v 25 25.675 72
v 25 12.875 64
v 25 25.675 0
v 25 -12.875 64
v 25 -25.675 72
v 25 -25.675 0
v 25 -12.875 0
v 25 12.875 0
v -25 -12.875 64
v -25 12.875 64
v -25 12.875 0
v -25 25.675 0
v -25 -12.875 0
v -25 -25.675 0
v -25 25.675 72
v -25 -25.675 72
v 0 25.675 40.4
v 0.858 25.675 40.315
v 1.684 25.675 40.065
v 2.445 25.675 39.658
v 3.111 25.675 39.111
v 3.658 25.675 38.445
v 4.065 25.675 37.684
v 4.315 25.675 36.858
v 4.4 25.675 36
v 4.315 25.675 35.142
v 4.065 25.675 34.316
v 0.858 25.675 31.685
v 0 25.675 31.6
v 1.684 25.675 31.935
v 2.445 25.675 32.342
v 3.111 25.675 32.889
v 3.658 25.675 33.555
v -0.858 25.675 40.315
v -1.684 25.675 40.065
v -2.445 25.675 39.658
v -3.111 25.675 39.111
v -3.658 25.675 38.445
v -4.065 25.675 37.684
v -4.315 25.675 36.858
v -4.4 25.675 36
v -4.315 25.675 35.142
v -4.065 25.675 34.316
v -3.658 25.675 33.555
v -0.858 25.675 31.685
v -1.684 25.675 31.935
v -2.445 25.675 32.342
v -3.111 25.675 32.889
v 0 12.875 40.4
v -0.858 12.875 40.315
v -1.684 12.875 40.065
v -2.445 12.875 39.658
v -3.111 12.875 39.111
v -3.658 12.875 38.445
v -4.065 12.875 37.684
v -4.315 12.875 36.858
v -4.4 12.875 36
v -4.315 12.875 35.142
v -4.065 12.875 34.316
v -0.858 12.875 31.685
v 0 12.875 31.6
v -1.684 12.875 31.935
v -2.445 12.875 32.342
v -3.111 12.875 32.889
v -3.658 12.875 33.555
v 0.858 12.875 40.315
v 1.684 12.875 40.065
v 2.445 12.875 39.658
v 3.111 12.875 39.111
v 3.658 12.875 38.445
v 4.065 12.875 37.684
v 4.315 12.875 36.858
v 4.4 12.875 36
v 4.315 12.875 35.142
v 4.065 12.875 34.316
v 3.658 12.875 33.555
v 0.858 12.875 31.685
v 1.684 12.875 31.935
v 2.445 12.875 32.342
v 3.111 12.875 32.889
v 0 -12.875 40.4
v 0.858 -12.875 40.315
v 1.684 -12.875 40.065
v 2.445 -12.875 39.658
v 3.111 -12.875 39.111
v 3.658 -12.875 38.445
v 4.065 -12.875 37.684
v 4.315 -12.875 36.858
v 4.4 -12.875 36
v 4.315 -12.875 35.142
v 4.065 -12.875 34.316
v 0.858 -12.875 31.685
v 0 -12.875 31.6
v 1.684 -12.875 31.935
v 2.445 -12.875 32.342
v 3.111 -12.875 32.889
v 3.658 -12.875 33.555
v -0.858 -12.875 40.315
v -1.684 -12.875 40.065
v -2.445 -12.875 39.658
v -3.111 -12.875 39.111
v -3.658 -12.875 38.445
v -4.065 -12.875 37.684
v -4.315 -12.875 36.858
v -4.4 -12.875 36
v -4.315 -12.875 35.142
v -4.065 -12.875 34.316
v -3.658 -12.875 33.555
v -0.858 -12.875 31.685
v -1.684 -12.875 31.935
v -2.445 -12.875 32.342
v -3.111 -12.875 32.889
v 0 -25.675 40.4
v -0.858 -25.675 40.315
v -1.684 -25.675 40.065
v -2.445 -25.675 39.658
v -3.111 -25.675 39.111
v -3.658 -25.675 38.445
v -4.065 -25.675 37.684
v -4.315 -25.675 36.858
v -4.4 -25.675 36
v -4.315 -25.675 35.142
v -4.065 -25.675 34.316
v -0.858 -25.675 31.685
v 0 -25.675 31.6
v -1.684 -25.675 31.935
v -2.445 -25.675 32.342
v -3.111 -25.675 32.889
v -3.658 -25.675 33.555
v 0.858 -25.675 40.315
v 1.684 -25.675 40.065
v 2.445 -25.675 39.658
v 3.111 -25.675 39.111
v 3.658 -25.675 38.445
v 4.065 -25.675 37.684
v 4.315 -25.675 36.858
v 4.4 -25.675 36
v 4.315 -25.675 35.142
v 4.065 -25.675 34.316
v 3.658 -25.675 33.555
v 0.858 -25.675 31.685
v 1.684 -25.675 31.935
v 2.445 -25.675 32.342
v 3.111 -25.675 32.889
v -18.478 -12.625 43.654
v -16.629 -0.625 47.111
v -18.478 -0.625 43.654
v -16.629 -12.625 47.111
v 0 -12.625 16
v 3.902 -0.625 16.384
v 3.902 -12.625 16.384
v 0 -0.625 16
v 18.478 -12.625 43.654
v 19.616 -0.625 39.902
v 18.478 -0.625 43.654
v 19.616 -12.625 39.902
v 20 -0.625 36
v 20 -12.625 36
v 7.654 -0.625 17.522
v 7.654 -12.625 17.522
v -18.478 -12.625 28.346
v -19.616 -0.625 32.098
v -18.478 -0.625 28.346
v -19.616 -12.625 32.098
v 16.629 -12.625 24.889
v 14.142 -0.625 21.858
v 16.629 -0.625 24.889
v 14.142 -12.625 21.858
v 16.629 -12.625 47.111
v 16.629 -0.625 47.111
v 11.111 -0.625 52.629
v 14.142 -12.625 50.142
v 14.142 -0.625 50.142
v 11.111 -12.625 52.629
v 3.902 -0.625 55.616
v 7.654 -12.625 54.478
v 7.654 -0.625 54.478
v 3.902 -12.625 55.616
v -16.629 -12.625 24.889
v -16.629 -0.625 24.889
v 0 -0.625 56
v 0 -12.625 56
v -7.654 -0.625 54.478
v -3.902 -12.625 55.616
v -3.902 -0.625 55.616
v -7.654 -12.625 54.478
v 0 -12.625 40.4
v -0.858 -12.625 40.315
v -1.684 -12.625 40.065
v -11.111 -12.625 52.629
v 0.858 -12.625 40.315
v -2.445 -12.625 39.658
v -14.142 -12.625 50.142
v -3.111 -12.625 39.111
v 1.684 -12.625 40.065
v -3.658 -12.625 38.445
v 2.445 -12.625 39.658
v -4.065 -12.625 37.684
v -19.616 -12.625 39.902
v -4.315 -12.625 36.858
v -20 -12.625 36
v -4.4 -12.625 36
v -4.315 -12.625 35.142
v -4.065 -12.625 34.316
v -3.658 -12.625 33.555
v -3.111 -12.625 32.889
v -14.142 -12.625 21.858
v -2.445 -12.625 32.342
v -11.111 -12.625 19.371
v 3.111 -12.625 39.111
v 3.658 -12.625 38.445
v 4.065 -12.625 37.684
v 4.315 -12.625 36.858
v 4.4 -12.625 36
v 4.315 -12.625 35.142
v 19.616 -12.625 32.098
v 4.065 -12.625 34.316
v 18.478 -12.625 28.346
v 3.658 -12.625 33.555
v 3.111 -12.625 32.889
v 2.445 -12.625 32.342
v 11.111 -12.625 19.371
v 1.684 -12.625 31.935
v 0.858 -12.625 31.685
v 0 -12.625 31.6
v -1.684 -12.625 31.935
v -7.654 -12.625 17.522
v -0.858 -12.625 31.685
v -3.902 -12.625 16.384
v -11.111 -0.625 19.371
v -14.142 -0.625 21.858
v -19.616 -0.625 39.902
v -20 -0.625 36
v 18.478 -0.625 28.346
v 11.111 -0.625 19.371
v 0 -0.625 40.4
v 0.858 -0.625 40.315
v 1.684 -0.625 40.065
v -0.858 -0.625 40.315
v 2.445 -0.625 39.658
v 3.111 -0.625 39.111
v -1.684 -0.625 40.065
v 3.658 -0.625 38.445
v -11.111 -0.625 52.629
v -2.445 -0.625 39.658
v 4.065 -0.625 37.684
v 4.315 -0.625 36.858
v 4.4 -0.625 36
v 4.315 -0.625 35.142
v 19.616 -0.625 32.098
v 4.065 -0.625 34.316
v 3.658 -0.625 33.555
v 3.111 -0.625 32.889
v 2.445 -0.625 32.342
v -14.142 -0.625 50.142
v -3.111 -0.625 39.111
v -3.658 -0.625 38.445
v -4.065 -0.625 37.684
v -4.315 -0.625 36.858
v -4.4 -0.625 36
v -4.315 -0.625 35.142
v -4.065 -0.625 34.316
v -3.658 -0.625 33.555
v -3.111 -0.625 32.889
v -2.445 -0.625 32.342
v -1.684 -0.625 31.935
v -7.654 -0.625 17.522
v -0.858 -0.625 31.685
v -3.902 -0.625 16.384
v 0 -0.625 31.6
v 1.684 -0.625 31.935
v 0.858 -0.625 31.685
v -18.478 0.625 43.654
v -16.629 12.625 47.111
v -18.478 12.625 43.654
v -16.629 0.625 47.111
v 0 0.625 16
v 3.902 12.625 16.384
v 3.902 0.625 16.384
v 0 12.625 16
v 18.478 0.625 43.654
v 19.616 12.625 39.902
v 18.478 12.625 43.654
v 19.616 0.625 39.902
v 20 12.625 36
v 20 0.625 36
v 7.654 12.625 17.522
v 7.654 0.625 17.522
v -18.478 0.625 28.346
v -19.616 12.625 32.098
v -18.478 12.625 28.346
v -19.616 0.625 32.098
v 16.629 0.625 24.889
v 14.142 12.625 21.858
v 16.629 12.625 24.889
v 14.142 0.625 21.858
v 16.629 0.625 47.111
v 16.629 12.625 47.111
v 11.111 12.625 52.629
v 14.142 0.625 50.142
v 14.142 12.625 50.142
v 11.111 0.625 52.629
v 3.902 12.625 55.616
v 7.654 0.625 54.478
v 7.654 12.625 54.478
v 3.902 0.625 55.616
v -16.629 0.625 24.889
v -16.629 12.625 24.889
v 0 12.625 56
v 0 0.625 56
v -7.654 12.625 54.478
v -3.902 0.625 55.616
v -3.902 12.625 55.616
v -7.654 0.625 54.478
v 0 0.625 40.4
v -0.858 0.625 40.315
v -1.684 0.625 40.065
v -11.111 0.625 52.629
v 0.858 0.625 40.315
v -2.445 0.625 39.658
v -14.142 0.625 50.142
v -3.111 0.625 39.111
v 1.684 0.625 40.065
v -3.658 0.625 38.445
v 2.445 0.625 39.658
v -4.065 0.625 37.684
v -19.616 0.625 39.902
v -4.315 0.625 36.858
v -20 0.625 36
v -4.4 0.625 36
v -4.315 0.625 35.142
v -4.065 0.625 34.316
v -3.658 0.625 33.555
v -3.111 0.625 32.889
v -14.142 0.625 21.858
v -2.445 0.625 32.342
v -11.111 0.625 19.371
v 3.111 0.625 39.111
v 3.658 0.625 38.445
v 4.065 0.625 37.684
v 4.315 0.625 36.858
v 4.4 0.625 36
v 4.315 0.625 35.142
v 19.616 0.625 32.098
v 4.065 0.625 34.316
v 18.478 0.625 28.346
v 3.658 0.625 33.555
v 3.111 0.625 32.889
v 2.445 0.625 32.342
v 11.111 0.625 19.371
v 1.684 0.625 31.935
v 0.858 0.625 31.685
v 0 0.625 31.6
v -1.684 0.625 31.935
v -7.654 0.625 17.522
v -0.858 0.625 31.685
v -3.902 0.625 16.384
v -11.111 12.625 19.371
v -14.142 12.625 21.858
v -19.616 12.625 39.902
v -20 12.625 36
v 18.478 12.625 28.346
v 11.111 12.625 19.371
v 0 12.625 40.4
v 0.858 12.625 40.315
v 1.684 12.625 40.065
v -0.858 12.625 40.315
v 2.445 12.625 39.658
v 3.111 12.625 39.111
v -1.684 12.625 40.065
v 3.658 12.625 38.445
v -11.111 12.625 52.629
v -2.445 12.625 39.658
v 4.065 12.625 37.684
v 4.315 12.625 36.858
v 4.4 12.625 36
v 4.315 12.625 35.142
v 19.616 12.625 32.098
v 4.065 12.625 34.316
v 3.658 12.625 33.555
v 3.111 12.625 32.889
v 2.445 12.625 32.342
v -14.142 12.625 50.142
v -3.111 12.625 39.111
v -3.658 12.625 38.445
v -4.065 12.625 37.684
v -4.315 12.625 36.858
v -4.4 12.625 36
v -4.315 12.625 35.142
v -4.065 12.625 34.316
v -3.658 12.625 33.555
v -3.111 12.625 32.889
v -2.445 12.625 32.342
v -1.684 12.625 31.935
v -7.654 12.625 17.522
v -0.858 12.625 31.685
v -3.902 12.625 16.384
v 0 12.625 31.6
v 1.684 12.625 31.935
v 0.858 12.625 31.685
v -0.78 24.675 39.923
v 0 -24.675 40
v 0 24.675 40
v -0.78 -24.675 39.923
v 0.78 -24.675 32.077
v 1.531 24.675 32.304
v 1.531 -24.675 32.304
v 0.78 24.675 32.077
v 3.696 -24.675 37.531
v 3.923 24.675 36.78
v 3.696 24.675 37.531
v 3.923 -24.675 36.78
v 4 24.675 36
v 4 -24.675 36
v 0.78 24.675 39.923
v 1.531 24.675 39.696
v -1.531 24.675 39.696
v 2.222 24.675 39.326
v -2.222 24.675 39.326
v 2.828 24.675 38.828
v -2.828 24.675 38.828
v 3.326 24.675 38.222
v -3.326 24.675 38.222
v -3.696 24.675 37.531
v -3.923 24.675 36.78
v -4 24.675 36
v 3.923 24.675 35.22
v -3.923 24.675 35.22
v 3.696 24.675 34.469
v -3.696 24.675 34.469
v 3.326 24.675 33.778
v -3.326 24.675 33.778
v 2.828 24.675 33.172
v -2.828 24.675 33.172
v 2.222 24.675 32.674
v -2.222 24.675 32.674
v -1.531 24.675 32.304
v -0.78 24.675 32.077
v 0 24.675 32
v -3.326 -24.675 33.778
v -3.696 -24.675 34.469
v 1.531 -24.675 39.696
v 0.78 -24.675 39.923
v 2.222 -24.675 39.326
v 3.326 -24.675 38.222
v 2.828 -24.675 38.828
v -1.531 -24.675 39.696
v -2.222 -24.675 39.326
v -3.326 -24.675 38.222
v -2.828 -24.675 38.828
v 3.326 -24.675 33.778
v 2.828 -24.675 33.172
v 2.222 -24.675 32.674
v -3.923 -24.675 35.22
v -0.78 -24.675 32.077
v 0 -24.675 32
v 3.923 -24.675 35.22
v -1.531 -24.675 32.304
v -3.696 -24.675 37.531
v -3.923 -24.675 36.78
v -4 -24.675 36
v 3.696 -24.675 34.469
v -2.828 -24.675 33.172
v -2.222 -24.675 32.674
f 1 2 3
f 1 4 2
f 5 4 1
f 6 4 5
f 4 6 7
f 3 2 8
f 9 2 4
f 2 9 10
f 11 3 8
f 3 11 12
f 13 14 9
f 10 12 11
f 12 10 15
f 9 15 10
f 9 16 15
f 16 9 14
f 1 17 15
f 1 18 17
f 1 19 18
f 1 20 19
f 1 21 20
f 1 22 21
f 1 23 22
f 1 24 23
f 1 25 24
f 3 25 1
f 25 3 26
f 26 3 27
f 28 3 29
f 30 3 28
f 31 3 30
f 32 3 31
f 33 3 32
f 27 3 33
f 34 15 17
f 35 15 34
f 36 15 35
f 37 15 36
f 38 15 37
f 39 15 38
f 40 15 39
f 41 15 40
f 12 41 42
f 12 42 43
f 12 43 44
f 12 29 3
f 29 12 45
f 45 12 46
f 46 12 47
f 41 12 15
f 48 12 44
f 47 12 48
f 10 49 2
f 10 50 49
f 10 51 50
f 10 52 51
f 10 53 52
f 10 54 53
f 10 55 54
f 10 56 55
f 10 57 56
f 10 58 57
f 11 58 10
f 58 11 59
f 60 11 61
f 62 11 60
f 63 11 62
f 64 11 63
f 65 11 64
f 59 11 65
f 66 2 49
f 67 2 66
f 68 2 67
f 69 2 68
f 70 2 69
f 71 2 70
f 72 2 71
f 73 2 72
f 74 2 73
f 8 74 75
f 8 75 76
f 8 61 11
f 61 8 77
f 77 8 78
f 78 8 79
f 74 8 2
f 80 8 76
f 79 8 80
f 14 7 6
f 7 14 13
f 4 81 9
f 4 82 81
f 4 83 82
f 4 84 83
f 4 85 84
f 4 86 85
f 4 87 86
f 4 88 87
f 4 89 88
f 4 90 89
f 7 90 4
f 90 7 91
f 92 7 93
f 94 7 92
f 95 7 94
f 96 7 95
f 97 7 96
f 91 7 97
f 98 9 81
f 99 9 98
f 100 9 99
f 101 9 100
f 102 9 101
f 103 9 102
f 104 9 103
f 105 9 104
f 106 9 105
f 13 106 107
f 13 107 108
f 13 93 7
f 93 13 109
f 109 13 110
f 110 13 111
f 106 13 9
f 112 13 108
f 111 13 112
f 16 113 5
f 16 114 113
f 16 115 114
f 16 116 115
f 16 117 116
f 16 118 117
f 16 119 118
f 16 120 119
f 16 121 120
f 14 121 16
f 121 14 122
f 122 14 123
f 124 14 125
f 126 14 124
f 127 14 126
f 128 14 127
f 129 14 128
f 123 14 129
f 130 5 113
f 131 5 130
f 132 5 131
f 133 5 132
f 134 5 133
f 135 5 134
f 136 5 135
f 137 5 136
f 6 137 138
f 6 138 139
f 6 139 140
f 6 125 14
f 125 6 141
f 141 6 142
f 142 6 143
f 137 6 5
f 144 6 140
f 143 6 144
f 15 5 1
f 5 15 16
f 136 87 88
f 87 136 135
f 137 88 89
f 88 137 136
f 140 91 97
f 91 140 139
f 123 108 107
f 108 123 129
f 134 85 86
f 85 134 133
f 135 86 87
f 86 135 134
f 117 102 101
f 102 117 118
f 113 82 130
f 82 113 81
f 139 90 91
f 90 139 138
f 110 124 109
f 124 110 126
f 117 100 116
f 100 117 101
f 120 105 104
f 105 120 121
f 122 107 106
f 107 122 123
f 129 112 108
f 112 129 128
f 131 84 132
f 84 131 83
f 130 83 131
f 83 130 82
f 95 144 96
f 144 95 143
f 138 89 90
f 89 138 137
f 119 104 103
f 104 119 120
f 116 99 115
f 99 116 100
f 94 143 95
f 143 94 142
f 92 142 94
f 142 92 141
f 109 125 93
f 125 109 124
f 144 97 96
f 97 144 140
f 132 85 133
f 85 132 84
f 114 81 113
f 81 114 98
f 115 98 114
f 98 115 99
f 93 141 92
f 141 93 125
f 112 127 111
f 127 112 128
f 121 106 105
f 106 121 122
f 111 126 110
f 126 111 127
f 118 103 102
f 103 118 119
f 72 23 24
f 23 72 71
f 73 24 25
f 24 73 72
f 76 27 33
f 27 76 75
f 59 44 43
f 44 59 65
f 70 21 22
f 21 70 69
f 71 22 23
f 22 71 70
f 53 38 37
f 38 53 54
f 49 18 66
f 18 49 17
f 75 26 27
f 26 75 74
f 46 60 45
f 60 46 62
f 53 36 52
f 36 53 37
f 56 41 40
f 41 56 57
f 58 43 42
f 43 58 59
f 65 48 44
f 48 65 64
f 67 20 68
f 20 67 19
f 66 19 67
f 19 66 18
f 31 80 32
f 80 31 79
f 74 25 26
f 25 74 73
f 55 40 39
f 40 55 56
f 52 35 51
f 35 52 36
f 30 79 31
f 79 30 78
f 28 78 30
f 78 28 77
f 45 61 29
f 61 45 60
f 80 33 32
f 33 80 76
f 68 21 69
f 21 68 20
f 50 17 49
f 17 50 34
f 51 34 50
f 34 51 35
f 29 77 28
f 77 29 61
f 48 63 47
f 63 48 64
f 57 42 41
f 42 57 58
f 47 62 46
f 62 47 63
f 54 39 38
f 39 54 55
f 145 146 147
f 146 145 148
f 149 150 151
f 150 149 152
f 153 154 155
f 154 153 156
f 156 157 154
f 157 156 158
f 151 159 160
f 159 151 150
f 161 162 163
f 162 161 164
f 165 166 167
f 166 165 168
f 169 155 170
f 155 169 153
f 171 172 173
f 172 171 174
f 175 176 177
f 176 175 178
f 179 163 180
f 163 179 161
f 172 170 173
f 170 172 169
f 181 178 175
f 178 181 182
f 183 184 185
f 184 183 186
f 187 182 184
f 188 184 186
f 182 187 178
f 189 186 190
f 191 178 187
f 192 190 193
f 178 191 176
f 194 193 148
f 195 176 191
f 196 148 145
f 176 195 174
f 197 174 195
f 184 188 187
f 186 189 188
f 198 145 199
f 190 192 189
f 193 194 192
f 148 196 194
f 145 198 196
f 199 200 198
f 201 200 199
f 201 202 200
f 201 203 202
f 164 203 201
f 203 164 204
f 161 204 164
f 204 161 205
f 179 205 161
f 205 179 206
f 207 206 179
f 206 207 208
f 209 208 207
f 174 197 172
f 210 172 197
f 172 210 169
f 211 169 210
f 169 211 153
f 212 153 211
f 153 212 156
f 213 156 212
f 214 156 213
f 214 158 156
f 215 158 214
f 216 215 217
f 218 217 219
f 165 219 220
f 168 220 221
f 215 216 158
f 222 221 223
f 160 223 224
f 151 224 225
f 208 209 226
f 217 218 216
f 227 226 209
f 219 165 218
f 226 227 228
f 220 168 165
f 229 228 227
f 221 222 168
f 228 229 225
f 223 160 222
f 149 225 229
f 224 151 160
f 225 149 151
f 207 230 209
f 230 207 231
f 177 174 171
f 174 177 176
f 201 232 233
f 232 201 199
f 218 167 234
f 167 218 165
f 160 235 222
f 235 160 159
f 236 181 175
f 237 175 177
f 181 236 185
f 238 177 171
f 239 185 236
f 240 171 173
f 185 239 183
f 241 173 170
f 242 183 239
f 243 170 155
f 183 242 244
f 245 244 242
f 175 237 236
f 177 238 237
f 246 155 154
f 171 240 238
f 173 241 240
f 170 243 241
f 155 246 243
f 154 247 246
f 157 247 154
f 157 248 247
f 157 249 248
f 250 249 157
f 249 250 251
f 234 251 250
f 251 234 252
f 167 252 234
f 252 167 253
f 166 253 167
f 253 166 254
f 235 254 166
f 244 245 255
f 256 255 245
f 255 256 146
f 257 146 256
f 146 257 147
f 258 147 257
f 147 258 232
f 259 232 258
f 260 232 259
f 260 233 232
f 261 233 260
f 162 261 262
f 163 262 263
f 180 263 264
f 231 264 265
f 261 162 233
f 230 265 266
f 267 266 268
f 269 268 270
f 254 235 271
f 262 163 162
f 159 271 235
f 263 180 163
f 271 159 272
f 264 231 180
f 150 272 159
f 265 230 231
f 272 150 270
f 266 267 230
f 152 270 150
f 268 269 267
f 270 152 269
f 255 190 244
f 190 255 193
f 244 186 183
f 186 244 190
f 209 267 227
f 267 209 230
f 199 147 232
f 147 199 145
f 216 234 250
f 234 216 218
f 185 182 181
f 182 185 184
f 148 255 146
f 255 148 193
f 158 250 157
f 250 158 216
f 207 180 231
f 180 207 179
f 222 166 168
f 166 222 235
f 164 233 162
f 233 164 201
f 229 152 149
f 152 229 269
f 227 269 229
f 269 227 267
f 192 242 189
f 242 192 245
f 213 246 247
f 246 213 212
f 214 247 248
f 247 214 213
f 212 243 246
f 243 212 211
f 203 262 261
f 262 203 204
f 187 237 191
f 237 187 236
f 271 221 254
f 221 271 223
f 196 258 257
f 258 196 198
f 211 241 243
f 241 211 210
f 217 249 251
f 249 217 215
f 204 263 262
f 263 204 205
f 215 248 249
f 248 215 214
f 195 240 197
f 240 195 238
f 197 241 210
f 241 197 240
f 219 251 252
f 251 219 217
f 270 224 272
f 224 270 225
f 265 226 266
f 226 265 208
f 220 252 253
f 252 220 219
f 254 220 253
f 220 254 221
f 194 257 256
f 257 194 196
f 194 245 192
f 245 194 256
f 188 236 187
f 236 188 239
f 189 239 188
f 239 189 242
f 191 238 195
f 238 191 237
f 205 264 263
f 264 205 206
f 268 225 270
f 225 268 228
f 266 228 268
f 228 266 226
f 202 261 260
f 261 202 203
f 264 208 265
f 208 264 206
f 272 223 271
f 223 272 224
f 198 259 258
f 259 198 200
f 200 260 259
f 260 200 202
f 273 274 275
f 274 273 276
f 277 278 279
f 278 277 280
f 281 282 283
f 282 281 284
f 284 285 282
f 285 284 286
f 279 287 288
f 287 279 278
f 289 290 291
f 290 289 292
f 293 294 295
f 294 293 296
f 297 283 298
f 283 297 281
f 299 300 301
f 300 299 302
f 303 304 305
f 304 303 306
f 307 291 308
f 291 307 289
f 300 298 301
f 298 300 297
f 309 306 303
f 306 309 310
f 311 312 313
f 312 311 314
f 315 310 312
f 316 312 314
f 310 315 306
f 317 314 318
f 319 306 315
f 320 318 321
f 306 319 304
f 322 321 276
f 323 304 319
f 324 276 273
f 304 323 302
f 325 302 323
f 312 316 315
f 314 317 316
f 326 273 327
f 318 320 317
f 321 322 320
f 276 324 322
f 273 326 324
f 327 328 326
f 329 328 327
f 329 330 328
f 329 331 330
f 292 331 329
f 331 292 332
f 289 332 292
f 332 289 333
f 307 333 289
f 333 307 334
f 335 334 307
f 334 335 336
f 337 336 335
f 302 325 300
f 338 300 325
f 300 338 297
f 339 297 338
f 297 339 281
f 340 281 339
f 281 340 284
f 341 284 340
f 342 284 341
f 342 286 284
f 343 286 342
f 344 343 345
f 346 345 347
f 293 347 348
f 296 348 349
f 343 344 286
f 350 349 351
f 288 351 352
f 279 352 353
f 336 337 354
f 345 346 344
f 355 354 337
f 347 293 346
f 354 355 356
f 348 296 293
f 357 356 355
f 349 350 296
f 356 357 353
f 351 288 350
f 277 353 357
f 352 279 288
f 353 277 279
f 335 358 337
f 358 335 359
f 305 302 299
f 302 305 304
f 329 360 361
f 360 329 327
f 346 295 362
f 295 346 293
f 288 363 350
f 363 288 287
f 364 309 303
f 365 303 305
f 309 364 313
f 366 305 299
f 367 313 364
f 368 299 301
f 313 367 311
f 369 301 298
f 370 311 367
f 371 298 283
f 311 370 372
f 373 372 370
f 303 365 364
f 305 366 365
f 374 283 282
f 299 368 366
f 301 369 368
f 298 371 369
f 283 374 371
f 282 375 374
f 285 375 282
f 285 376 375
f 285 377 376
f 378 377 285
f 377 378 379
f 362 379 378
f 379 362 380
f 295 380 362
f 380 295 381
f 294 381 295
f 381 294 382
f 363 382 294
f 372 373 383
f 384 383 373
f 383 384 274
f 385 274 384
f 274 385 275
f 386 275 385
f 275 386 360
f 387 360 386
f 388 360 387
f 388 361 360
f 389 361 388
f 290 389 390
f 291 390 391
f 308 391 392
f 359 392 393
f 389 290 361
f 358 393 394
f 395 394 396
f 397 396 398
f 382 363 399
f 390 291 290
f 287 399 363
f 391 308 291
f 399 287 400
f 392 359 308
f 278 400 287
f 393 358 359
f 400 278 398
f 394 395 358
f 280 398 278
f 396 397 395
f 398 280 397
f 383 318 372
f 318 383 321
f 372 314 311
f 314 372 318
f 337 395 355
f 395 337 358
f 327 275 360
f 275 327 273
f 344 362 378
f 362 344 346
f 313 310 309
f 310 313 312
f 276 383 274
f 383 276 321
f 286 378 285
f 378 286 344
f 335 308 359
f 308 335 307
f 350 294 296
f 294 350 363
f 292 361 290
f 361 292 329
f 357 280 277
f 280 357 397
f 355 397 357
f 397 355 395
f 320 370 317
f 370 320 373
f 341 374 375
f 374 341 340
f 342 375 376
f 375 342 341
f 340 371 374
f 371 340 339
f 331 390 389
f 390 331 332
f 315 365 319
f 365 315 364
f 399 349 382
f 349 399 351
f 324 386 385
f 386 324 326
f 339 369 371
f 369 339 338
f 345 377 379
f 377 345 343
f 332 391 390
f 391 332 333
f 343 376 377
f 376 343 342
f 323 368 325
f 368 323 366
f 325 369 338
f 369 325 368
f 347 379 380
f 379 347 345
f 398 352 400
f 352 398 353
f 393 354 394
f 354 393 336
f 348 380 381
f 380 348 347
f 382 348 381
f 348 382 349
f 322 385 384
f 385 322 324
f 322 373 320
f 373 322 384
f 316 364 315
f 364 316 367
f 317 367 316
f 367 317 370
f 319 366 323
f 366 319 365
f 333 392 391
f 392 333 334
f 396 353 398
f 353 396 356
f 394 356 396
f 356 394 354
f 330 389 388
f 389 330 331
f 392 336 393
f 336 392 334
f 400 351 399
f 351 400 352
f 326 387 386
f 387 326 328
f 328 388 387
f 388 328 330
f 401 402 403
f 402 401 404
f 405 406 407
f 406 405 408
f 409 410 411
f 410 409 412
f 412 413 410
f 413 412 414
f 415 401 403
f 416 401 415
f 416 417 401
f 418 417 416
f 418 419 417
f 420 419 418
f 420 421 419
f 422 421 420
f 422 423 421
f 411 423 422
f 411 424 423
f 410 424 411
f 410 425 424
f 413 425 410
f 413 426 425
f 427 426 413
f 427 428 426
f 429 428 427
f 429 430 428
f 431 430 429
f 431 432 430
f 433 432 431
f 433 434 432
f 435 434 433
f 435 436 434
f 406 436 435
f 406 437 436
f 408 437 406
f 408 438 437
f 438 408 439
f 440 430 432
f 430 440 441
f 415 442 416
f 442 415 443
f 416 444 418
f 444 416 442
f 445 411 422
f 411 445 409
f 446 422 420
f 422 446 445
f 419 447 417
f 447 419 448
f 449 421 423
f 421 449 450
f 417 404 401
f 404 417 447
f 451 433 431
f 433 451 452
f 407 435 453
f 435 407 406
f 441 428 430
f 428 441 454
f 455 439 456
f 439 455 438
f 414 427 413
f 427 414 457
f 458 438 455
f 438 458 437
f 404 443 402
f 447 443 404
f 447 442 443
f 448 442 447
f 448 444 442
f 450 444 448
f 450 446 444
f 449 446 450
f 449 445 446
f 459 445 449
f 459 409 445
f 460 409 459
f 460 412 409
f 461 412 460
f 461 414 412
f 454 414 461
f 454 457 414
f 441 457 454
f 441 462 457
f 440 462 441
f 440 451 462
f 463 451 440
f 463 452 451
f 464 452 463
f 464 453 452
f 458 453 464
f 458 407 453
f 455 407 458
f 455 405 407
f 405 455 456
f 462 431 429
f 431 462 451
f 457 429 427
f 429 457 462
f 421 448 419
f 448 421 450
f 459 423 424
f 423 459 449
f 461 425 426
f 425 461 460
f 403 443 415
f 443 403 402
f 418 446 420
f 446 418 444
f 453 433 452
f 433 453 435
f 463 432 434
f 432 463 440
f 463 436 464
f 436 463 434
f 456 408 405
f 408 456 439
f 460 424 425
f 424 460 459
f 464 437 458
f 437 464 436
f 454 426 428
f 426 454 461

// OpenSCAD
$fn = 32;

// ------------------------------------------------------------------------
// Trolley wheel set: wheels d40, fork 64 mm tall
// Every part is its own module, assembly() places every instance.
// ------------------------------------------------------------------------

// --- part 1 ---
module trolley_fork() {
  difference() {
    union() {
      translate([-25, 12.875, 0]) cube([50, 12.8, 64]);
      translate([-25, -25.675, 0]) cube([50, 12.8, 64]);
      translate([-25, -25.675, 64]) cube([50, 51.35, 8]);
    }
    translate([0, -19.275, 36]) rotate([90, 0, 0]) cylinder(h = 14.8, d = 8.8, center = true);
    translate([0, 19.275, 36]) rotate([90, 0, 0]) cylinder(h = 14.8, d = 8.8, center = true);
  }
}

// --- part 2 ---
module trolley_wheel() {
  difference() {
      translate([0, 0, 0]) cylinder(h = 12, d = 40);
      translate([0, 0, -1]) cylinder(h = 14, d = 8.8);
    }
}

// --- part 3 ---
module trolley_axle() {
  translate([0, 0, -24.675]) cylinder(h = 49.35, d = 8);
}

// --- assembly ---
module assembly() {
  color([0.80, 0.24, 0.20]) translate([0, 0, 0]) rotate([0, 0, 0]) trolley_fork();
  color([0.20, 0.45, 0.75]) translate([0, -0.625, 36]) rotate([90, 0, 0]) trolley_wheel();
  color([0.25, 0.62, 0.32]) translate([0, 12.625, 36]) rotate([90, 0, 0]) trolley_wheel();
  color([0.92, 0.70, 0.18]) translate([0, 0, 36]) rotate([90, 0, 0]) trolley_axle();
}

assembly();
